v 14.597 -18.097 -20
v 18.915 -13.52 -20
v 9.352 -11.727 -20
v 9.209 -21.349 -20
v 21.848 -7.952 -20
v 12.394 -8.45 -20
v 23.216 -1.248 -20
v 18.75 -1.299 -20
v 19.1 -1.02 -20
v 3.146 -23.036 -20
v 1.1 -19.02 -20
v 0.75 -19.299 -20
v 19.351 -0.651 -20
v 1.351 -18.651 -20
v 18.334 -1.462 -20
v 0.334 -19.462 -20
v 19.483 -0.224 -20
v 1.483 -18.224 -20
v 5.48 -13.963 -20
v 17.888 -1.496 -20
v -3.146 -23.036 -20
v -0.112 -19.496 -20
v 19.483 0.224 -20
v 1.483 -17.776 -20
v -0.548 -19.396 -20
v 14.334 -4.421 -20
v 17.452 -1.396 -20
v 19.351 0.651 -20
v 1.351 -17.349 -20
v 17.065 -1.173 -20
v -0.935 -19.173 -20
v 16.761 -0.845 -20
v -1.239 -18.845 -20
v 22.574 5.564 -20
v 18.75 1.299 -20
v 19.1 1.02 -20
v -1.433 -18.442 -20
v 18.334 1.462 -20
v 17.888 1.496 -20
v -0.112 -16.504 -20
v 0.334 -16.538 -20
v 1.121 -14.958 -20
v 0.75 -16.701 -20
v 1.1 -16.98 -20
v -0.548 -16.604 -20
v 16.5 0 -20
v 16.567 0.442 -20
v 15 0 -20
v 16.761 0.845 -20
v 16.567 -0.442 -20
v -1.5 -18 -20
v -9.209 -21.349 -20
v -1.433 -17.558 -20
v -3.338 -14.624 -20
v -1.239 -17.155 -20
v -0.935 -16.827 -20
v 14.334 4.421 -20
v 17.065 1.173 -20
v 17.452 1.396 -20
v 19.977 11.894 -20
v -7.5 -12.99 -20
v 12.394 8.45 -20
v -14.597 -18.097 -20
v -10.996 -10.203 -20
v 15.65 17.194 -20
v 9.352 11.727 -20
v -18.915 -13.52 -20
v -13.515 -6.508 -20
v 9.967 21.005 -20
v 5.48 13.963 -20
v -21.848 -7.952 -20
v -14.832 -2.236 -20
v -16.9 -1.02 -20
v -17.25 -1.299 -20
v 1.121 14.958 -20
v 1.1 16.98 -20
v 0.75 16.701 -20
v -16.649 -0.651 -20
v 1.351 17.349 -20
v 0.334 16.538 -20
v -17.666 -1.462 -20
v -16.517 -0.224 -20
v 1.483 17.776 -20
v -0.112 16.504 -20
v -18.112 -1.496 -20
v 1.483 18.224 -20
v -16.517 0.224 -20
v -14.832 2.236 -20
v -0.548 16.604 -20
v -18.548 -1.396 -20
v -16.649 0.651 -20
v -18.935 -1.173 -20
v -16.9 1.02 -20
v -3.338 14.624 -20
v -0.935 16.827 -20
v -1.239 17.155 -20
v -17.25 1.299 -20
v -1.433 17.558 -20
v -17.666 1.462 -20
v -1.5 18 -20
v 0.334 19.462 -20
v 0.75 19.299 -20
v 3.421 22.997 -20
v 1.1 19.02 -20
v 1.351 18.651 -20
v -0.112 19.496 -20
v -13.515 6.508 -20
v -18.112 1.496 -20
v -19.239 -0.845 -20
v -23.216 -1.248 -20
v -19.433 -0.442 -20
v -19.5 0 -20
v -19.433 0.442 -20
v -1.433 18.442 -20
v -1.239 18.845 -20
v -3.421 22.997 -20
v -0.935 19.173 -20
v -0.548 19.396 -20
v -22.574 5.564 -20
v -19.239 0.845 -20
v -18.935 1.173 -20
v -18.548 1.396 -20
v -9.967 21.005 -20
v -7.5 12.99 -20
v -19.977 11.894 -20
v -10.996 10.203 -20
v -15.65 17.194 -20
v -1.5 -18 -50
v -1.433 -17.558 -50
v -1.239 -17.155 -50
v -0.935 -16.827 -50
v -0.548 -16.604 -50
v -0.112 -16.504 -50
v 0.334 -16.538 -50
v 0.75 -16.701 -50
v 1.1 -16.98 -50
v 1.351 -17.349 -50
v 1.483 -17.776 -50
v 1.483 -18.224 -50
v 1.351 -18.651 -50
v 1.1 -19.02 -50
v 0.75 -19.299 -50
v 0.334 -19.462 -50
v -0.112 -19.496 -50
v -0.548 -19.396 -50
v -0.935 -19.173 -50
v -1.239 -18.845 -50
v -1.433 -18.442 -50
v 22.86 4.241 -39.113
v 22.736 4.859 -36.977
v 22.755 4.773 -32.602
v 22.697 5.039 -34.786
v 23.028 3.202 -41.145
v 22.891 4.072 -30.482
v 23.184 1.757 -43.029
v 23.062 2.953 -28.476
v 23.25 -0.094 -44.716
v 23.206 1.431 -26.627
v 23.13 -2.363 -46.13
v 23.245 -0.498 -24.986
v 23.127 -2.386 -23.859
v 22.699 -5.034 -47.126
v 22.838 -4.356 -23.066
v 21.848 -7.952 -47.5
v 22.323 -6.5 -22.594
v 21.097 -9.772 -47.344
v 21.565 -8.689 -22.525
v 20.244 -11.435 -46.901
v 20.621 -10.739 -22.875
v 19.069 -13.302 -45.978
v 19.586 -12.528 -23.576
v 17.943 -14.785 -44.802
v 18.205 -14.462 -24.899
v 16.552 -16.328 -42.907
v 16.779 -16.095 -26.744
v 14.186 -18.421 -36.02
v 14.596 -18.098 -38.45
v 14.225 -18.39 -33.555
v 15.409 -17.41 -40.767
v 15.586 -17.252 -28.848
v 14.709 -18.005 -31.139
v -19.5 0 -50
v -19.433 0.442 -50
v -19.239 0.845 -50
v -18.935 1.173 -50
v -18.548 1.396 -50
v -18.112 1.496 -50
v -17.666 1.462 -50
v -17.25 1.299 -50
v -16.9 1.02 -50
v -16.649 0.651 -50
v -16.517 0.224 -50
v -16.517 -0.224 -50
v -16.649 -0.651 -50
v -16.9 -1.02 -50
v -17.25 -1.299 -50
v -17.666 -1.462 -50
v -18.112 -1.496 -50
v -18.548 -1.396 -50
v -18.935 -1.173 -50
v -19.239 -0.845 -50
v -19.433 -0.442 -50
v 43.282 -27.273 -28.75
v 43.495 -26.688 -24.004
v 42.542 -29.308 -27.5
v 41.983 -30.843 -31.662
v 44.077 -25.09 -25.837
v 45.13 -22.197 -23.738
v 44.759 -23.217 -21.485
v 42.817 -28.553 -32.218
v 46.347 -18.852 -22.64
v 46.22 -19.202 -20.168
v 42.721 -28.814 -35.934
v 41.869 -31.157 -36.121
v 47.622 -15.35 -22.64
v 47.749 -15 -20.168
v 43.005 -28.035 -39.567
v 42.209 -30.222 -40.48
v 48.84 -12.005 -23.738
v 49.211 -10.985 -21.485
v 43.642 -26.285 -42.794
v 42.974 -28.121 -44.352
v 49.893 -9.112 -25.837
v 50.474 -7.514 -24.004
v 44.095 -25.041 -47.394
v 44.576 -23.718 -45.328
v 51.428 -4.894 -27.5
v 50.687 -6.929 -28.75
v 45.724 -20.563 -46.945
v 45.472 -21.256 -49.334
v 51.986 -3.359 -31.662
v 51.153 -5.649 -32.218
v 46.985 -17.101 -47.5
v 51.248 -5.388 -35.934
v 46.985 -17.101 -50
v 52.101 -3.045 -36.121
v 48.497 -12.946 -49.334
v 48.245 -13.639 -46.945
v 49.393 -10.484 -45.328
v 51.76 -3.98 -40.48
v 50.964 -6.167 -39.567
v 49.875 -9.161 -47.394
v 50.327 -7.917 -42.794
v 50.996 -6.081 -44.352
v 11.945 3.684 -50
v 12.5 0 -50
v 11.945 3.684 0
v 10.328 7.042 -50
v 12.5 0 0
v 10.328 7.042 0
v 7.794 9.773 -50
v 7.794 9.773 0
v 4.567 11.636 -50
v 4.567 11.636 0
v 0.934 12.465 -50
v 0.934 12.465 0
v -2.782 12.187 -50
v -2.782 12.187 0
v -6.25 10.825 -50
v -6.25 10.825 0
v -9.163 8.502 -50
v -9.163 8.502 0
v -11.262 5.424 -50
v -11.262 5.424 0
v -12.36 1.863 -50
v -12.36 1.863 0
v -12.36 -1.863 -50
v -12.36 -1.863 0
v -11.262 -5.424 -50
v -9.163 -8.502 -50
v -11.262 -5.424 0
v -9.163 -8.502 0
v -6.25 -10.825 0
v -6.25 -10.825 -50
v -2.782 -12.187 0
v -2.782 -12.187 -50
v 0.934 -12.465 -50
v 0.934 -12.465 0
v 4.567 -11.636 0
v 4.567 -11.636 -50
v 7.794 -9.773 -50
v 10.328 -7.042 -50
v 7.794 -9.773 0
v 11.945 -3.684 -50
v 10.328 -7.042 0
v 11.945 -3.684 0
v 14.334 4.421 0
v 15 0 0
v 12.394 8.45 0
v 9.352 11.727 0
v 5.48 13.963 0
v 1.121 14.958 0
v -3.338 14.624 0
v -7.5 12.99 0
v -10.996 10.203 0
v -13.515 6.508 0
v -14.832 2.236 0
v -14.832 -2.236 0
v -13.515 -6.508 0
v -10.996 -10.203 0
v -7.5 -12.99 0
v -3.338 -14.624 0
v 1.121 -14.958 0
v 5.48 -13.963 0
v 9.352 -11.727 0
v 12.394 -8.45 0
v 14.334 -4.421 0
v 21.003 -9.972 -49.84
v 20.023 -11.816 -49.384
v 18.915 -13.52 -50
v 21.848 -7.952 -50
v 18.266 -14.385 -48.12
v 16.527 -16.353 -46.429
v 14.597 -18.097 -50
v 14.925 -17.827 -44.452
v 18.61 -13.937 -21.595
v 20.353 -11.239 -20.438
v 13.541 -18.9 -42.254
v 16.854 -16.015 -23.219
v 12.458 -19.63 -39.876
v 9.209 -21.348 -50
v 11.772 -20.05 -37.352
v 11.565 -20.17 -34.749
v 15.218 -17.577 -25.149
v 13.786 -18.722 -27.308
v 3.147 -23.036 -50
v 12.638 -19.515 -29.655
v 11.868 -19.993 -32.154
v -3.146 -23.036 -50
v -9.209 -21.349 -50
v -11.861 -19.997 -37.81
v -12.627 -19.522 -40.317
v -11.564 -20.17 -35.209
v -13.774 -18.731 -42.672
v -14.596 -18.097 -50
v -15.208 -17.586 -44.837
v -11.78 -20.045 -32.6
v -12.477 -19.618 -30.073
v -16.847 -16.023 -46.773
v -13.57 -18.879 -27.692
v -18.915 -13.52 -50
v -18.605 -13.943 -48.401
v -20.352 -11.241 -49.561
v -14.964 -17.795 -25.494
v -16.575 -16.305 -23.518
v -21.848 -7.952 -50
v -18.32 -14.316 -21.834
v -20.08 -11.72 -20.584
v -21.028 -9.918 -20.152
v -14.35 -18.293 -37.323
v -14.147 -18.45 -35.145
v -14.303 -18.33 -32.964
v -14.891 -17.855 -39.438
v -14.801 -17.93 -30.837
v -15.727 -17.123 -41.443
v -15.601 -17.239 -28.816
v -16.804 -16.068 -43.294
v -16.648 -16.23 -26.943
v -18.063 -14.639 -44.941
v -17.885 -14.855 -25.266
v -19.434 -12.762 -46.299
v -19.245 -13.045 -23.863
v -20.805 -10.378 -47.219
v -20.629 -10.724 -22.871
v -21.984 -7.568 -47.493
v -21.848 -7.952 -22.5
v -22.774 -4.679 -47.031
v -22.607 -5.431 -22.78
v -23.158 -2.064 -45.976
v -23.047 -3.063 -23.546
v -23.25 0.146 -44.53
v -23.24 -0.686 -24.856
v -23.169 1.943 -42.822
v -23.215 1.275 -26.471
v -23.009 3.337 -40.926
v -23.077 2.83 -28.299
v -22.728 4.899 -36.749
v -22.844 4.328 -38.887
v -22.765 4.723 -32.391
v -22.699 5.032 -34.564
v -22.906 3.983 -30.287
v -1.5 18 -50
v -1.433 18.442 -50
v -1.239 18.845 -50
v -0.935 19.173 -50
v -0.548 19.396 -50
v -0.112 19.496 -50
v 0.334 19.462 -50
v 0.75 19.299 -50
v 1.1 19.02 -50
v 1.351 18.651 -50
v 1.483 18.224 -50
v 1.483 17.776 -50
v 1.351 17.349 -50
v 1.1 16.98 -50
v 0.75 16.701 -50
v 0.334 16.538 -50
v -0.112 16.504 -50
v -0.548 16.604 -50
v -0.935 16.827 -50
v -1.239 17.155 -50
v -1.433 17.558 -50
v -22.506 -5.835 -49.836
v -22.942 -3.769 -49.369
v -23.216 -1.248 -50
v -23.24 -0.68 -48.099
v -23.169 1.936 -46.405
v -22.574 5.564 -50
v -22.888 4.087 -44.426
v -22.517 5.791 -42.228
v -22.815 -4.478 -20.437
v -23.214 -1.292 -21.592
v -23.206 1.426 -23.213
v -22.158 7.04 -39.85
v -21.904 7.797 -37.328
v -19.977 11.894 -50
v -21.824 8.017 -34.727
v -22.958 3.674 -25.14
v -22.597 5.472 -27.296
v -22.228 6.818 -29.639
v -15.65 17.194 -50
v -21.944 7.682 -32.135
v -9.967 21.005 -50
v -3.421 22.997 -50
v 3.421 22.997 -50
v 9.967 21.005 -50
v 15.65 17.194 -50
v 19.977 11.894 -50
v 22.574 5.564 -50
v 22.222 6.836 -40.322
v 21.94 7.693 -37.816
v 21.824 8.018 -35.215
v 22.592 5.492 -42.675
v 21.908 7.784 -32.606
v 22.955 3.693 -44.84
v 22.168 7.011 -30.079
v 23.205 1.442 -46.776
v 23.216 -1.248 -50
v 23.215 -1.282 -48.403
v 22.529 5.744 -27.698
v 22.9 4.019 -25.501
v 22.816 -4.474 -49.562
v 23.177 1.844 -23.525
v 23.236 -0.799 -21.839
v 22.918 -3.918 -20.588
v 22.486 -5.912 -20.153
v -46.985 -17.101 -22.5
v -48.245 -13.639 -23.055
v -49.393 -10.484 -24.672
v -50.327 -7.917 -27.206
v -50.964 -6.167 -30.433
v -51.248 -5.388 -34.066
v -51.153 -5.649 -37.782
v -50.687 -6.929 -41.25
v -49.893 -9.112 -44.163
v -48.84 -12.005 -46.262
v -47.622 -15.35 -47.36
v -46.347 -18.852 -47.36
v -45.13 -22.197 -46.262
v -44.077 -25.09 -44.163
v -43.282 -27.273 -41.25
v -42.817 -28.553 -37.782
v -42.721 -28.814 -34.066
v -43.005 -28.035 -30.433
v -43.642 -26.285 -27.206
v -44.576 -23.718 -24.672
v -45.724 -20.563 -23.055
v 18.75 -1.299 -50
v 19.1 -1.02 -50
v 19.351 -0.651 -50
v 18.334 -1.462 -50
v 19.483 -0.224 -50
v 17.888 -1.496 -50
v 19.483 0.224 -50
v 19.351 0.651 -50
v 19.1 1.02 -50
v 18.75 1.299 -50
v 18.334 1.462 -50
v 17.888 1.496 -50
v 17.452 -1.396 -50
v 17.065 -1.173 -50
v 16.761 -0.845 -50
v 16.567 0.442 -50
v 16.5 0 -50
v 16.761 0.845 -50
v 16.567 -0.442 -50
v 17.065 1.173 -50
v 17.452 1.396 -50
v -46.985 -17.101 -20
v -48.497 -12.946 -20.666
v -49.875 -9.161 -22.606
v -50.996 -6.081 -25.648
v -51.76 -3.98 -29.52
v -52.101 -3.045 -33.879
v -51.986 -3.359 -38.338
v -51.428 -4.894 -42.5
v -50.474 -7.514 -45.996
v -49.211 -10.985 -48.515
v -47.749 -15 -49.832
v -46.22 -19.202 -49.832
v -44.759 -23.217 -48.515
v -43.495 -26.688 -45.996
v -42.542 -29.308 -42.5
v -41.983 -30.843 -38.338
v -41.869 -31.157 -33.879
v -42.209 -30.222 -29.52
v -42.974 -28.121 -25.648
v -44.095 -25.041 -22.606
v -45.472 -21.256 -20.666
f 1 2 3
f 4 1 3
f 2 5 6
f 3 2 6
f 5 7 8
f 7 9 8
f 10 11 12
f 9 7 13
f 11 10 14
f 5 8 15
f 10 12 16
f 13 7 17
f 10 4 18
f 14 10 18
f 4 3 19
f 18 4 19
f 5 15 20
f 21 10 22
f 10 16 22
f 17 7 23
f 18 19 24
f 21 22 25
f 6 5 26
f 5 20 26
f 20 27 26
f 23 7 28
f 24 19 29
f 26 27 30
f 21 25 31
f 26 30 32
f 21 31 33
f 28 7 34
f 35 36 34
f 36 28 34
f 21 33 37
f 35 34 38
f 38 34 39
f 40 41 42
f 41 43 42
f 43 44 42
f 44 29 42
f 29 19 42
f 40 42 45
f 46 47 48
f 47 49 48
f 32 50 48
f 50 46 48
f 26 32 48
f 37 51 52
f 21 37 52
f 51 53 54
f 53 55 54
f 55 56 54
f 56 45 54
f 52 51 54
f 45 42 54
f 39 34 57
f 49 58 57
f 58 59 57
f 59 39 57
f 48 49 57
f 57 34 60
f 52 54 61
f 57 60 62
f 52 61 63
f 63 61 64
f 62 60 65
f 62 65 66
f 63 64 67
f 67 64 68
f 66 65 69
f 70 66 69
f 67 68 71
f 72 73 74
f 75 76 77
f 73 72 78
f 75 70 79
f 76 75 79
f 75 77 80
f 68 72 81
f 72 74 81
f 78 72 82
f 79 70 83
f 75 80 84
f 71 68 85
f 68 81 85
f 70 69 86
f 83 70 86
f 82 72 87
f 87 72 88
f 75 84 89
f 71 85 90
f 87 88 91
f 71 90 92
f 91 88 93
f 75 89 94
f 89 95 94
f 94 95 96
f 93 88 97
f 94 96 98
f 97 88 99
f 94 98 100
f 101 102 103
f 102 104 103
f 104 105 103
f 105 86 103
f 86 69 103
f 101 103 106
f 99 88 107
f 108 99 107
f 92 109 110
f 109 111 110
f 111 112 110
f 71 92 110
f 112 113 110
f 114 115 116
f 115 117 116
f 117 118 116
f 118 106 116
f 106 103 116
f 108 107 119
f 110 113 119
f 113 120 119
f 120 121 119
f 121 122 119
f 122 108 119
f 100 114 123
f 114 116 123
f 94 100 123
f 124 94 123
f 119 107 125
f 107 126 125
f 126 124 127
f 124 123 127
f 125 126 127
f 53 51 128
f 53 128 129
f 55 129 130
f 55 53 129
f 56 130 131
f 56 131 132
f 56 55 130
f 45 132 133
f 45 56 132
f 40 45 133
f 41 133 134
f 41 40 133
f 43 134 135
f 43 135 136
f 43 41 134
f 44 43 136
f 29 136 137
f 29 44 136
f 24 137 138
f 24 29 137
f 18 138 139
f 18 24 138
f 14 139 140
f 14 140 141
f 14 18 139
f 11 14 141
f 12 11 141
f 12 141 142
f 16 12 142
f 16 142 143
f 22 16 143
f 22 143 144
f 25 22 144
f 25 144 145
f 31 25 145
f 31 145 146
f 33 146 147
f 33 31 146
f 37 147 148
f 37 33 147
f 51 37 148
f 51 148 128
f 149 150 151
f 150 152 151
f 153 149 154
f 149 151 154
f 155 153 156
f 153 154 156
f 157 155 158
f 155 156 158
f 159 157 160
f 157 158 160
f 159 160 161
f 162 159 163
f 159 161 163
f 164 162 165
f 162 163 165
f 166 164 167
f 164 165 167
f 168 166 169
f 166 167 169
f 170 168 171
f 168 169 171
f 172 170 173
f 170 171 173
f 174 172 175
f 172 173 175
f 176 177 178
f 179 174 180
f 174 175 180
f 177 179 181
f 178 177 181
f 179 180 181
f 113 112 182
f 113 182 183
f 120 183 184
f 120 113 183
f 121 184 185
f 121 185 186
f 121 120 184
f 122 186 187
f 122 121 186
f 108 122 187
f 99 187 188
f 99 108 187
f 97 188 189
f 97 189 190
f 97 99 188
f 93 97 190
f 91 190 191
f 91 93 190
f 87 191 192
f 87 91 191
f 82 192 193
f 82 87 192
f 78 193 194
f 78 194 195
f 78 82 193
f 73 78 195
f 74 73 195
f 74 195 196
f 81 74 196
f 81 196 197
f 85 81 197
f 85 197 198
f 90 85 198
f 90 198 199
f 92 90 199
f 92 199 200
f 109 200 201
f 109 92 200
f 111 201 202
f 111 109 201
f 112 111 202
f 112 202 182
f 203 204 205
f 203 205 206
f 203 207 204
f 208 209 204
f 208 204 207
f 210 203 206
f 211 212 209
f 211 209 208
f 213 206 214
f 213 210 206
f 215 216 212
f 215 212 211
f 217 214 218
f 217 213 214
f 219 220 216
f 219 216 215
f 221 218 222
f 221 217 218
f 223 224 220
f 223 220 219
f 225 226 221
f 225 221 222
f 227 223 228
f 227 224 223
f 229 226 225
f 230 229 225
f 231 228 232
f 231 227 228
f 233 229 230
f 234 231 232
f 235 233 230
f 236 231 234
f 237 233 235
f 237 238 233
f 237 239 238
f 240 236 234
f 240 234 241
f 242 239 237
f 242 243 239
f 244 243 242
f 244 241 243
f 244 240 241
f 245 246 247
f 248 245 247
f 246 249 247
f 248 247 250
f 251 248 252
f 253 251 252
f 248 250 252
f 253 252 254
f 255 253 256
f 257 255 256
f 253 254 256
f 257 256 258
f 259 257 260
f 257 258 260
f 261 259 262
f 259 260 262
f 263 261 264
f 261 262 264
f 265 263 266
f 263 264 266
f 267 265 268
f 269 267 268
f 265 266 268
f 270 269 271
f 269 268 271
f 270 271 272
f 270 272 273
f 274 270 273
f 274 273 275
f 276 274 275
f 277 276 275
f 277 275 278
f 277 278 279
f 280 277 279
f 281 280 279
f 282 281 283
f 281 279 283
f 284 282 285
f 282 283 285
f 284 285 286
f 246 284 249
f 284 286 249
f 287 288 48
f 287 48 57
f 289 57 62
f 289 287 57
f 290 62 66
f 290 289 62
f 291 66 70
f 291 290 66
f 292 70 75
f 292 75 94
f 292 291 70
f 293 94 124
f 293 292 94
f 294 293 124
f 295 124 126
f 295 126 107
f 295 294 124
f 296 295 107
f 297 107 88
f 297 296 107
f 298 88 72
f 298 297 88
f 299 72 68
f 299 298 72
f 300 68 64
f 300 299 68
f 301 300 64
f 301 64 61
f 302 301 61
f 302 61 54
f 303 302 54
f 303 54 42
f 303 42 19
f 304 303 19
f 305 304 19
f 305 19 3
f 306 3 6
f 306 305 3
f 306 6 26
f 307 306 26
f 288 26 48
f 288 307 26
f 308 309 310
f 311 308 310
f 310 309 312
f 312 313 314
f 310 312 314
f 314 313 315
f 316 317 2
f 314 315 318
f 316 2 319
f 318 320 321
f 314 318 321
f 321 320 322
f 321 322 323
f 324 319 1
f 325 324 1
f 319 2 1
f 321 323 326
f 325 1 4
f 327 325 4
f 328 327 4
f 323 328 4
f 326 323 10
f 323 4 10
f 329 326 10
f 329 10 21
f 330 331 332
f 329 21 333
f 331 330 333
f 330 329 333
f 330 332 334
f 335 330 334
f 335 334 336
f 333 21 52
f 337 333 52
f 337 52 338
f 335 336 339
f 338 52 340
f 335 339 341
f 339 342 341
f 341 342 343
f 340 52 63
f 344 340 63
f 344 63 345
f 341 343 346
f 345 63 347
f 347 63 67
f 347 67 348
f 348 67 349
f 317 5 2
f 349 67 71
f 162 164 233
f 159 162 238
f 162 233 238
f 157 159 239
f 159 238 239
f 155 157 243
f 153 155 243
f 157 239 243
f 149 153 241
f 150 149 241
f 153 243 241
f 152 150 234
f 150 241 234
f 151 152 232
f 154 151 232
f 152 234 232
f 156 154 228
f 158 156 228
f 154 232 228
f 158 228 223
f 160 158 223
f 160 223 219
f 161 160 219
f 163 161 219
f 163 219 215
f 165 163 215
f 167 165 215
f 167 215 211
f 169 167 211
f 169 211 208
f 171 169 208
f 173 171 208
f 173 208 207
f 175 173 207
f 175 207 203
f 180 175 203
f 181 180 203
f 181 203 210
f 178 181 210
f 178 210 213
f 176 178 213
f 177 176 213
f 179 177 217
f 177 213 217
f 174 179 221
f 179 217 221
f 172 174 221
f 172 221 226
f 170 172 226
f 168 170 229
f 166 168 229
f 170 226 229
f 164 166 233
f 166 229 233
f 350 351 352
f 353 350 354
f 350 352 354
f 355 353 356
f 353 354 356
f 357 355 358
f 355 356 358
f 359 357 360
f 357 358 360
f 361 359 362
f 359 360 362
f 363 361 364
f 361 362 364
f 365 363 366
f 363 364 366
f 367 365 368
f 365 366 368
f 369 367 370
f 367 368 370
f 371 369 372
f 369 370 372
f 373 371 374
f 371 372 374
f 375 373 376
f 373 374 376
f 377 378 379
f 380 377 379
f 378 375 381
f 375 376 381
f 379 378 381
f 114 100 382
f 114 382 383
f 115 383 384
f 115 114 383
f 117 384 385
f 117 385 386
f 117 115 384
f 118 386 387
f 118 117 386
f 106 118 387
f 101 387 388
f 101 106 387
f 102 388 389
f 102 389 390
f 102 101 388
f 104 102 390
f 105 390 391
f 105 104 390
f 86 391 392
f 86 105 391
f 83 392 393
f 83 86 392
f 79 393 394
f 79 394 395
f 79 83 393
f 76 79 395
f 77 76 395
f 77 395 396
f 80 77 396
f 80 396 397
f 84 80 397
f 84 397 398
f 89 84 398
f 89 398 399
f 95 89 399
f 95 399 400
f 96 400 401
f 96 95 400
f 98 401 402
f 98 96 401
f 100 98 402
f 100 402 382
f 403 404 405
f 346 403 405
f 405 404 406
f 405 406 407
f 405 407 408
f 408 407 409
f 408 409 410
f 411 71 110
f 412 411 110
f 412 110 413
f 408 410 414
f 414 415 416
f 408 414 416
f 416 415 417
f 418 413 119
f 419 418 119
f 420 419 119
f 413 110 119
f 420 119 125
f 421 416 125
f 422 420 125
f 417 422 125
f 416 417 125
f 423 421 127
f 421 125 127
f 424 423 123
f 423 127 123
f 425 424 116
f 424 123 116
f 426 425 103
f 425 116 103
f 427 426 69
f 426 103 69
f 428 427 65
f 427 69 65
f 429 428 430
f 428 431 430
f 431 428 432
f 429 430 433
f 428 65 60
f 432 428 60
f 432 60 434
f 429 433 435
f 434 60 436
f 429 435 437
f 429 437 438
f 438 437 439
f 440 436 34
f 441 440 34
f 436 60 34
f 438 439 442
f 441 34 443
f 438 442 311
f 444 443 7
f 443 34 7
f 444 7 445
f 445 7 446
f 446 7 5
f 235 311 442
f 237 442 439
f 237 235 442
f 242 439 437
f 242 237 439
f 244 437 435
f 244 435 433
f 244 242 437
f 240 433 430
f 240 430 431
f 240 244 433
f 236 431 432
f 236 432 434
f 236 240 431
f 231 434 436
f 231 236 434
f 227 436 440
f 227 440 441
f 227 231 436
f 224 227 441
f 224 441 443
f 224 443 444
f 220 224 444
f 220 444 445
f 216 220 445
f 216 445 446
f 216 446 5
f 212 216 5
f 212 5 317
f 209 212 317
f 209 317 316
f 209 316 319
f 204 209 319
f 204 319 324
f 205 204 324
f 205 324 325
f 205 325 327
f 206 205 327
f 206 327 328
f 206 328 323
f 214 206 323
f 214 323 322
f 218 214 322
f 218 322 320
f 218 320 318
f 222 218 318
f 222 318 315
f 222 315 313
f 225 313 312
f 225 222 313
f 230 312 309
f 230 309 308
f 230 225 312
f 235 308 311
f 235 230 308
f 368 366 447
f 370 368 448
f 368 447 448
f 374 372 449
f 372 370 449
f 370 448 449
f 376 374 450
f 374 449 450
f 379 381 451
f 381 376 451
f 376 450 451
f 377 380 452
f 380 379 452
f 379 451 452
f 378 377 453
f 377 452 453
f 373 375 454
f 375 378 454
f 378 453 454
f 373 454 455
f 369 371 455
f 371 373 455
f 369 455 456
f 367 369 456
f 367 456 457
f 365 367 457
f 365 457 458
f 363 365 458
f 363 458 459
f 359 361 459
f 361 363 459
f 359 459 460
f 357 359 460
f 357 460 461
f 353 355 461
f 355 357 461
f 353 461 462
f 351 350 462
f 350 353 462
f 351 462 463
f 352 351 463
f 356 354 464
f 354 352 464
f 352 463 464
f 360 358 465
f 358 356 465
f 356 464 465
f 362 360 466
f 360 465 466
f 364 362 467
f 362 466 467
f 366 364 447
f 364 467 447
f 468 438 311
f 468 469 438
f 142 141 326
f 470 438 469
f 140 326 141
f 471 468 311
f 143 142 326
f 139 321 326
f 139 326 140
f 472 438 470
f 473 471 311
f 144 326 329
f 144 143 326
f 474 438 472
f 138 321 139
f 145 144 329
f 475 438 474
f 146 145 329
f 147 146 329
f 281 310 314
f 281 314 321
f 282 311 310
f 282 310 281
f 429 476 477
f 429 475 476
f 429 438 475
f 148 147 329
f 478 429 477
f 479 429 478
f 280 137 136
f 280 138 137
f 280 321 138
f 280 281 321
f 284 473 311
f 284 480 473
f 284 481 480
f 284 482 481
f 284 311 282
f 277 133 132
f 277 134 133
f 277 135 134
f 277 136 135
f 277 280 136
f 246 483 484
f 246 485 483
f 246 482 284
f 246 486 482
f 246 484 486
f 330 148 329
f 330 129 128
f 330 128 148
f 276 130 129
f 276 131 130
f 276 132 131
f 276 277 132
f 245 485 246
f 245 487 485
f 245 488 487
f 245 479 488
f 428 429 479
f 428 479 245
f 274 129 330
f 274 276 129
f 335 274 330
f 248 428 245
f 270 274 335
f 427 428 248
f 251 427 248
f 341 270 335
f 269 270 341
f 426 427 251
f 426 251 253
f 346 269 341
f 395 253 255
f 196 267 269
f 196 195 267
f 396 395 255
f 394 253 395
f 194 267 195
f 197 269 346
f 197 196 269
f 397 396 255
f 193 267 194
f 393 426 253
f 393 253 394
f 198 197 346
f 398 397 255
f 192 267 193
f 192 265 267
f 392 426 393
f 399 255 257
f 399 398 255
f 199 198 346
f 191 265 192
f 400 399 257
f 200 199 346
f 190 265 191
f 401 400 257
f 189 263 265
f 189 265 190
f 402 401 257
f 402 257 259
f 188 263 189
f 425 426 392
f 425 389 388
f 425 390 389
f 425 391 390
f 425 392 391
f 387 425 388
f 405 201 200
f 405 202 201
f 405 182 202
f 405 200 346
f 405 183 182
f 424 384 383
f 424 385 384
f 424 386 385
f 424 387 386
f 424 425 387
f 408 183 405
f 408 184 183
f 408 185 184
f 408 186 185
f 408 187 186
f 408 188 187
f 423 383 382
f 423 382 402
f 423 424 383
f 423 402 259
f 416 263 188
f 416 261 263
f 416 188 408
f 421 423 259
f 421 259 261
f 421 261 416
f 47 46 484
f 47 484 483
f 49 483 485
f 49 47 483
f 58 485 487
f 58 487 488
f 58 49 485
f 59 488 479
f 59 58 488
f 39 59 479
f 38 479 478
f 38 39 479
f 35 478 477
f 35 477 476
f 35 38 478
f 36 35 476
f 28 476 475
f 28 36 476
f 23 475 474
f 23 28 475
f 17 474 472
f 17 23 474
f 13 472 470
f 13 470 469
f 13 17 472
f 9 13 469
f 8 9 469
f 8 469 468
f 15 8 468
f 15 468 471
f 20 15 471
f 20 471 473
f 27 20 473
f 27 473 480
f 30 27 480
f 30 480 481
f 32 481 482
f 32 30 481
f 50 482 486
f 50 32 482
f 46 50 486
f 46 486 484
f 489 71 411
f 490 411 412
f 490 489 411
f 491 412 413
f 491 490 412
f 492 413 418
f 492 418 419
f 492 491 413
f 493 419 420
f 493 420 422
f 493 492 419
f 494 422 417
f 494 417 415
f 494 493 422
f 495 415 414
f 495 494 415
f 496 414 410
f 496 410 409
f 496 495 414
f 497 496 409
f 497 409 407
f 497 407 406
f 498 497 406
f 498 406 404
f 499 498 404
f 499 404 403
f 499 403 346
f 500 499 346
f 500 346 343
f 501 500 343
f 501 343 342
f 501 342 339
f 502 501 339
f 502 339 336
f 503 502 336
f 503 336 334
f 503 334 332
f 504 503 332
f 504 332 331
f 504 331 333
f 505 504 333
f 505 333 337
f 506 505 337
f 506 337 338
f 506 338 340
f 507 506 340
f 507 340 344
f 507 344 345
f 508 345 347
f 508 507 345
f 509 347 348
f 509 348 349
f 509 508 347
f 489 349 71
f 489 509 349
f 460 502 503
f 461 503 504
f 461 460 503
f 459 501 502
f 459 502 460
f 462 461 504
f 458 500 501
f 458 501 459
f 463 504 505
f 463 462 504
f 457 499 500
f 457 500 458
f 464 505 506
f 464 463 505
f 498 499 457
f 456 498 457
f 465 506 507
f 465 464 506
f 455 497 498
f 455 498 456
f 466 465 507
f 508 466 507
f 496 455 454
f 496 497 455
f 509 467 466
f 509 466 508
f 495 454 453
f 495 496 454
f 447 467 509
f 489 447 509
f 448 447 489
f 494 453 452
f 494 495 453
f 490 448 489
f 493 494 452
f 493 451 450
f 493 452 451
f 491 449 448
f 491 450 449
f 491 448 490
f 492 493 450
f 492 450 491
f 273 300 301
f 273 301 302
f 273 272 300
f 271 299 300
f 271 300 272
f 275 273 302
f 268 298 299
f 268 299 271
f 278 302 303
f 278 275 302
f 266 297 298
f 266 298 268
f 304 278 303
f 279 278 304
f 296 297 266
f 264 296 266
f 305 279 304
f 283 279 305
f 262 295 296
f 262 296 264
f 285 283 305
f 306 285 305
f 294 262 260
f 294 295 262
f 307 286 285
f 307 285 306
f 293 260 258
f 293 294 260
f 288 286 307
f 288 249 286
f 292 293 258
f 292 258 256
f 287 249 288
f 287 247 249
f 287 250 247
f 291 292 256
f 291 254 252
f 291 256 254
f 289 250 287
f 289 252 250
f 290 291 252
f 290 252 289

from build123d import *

# Parameters (mm, degrees)
CROQUIS1_R              = 15
CROQUIS1_R_2            = 12.5
SALIENTE_EXTRUIR1_DEPTH = 20
CROQUIS8_R              = 23.25
CROQUIS8_R_2            = 1.5
SALIENTE_EXTRUIR2_DEPTH = 30
SALIENTE_EXTRUIR4_REACH = 81.8
CROQUIS6_R              = 15
CROQUIS6_R_2            = 12.5
SALIENTE_EXTRUIR5_REACH = 108.924
CROQUIS7_R              = 15
CROQUIS7_R_2            = 12.5
CROQUIS9_R              = 12.5
CORTAR_EXTRUIR1_DEPTH   = 31.000000103


with BuildPart() as part:
    # Croquis1 → Saliente-Extruir1 (new body)
    with BuildSketch(Plane.XY):
        Circle(CROQUIS1_R)
        Circle(CROQUIS1_R_2, mode=Mode.SUBTRACT)
    extrude(amount=-SALIENTE_EXTRUIR1_DEPTH)

    # Croquis8 → Saliente-Extruir2 (add)
    with BuildSketch(Plane(origin=(0, 0, -20), x_dir=(-1, 0, 0), z_dir=(0, 0, -1))):
        Circle(CROQUIS8_R)
        with Locations((0, 18)):
            Circle(CROQUIS8_R_2, mode=Mode.SUBTRACT)
        with Locations((18, 0)):
            Circle(CROQUIS8_R_2, mode=Mode.SUBTRACT)
        with Locations((0, -18)):
            Circle(CROQUIS8_R_2, mode=Mode.SUBTRACT)
        with Locations((-18, 0)):
            Circle(CROQUIS8_R_2, mode=Mode.SUBTRACT)
    extrude(amount=SALIENTE_EXTRUIR2_DEPTH)

    # Croquis6 → Saliente-Extruir4 (add, up to next)
    with BuildSketch(Plane(origin=(46.984631039, -17.101007166, -35), x_dir=(0, 0, -1), z_dir=(0.939692621, -0.342020143, 0)), mode=Mode.PRIVATE) as saliente_extruir4_sk1:
        Circle(CROQUIS6_R)
        Circle(CROQUIS6_R_2, mode=Mode.SUBTRACT)
    saliente_extruir4_tool1 = extrude(saliente_extruir4_sk1.sketch, amount=-SALIENTE_EXTRUIR4_REACH, mode=Mode.PRIVATE) - part.part
    add(saliente_extruir4_tool1.solids().sort_by_distance((46.984631, -17.101007, -20.424264))[0])

    # Croquis7 → Saliente-Extruir5 (add, up to next)
    with BuildSketch(Plane(origin=(-46.984631039, -17.101007166, -35), x_dir=(0, 0, 1), z_dir=(-0.939692621, -0.342020143, 0)), mode=Mode.PRIVATE) as saliente_extruir5_sk1:
        Circle(CROQUIS7_R)
        Circle(CROQUIS7_R_2, mode=Mode.SUBTRACT)
    saliente_extruir5_tool1 = extrude(saliente_extruir5_sk1.sketch, amount=-SALIENTE_EXTRUIR5_REACH, mode=Mode.PRIVATE) - part.part
    add(saliente_extruir5_tool1.solids().sort_by_distance((-46.984631, -17.101007, -49.575736))[0])

    # Croquis9 → Cortar-Extruir1 (cut, through all)
    with BuildSketch(Plane.XY.offset(-20)):
        Circle(CROQUIS9_R)
    extrude(amount=-CORTAR_EXTRUIR1_DEPTH, mode=Mode.SUBTRACT)


solid = part.part
